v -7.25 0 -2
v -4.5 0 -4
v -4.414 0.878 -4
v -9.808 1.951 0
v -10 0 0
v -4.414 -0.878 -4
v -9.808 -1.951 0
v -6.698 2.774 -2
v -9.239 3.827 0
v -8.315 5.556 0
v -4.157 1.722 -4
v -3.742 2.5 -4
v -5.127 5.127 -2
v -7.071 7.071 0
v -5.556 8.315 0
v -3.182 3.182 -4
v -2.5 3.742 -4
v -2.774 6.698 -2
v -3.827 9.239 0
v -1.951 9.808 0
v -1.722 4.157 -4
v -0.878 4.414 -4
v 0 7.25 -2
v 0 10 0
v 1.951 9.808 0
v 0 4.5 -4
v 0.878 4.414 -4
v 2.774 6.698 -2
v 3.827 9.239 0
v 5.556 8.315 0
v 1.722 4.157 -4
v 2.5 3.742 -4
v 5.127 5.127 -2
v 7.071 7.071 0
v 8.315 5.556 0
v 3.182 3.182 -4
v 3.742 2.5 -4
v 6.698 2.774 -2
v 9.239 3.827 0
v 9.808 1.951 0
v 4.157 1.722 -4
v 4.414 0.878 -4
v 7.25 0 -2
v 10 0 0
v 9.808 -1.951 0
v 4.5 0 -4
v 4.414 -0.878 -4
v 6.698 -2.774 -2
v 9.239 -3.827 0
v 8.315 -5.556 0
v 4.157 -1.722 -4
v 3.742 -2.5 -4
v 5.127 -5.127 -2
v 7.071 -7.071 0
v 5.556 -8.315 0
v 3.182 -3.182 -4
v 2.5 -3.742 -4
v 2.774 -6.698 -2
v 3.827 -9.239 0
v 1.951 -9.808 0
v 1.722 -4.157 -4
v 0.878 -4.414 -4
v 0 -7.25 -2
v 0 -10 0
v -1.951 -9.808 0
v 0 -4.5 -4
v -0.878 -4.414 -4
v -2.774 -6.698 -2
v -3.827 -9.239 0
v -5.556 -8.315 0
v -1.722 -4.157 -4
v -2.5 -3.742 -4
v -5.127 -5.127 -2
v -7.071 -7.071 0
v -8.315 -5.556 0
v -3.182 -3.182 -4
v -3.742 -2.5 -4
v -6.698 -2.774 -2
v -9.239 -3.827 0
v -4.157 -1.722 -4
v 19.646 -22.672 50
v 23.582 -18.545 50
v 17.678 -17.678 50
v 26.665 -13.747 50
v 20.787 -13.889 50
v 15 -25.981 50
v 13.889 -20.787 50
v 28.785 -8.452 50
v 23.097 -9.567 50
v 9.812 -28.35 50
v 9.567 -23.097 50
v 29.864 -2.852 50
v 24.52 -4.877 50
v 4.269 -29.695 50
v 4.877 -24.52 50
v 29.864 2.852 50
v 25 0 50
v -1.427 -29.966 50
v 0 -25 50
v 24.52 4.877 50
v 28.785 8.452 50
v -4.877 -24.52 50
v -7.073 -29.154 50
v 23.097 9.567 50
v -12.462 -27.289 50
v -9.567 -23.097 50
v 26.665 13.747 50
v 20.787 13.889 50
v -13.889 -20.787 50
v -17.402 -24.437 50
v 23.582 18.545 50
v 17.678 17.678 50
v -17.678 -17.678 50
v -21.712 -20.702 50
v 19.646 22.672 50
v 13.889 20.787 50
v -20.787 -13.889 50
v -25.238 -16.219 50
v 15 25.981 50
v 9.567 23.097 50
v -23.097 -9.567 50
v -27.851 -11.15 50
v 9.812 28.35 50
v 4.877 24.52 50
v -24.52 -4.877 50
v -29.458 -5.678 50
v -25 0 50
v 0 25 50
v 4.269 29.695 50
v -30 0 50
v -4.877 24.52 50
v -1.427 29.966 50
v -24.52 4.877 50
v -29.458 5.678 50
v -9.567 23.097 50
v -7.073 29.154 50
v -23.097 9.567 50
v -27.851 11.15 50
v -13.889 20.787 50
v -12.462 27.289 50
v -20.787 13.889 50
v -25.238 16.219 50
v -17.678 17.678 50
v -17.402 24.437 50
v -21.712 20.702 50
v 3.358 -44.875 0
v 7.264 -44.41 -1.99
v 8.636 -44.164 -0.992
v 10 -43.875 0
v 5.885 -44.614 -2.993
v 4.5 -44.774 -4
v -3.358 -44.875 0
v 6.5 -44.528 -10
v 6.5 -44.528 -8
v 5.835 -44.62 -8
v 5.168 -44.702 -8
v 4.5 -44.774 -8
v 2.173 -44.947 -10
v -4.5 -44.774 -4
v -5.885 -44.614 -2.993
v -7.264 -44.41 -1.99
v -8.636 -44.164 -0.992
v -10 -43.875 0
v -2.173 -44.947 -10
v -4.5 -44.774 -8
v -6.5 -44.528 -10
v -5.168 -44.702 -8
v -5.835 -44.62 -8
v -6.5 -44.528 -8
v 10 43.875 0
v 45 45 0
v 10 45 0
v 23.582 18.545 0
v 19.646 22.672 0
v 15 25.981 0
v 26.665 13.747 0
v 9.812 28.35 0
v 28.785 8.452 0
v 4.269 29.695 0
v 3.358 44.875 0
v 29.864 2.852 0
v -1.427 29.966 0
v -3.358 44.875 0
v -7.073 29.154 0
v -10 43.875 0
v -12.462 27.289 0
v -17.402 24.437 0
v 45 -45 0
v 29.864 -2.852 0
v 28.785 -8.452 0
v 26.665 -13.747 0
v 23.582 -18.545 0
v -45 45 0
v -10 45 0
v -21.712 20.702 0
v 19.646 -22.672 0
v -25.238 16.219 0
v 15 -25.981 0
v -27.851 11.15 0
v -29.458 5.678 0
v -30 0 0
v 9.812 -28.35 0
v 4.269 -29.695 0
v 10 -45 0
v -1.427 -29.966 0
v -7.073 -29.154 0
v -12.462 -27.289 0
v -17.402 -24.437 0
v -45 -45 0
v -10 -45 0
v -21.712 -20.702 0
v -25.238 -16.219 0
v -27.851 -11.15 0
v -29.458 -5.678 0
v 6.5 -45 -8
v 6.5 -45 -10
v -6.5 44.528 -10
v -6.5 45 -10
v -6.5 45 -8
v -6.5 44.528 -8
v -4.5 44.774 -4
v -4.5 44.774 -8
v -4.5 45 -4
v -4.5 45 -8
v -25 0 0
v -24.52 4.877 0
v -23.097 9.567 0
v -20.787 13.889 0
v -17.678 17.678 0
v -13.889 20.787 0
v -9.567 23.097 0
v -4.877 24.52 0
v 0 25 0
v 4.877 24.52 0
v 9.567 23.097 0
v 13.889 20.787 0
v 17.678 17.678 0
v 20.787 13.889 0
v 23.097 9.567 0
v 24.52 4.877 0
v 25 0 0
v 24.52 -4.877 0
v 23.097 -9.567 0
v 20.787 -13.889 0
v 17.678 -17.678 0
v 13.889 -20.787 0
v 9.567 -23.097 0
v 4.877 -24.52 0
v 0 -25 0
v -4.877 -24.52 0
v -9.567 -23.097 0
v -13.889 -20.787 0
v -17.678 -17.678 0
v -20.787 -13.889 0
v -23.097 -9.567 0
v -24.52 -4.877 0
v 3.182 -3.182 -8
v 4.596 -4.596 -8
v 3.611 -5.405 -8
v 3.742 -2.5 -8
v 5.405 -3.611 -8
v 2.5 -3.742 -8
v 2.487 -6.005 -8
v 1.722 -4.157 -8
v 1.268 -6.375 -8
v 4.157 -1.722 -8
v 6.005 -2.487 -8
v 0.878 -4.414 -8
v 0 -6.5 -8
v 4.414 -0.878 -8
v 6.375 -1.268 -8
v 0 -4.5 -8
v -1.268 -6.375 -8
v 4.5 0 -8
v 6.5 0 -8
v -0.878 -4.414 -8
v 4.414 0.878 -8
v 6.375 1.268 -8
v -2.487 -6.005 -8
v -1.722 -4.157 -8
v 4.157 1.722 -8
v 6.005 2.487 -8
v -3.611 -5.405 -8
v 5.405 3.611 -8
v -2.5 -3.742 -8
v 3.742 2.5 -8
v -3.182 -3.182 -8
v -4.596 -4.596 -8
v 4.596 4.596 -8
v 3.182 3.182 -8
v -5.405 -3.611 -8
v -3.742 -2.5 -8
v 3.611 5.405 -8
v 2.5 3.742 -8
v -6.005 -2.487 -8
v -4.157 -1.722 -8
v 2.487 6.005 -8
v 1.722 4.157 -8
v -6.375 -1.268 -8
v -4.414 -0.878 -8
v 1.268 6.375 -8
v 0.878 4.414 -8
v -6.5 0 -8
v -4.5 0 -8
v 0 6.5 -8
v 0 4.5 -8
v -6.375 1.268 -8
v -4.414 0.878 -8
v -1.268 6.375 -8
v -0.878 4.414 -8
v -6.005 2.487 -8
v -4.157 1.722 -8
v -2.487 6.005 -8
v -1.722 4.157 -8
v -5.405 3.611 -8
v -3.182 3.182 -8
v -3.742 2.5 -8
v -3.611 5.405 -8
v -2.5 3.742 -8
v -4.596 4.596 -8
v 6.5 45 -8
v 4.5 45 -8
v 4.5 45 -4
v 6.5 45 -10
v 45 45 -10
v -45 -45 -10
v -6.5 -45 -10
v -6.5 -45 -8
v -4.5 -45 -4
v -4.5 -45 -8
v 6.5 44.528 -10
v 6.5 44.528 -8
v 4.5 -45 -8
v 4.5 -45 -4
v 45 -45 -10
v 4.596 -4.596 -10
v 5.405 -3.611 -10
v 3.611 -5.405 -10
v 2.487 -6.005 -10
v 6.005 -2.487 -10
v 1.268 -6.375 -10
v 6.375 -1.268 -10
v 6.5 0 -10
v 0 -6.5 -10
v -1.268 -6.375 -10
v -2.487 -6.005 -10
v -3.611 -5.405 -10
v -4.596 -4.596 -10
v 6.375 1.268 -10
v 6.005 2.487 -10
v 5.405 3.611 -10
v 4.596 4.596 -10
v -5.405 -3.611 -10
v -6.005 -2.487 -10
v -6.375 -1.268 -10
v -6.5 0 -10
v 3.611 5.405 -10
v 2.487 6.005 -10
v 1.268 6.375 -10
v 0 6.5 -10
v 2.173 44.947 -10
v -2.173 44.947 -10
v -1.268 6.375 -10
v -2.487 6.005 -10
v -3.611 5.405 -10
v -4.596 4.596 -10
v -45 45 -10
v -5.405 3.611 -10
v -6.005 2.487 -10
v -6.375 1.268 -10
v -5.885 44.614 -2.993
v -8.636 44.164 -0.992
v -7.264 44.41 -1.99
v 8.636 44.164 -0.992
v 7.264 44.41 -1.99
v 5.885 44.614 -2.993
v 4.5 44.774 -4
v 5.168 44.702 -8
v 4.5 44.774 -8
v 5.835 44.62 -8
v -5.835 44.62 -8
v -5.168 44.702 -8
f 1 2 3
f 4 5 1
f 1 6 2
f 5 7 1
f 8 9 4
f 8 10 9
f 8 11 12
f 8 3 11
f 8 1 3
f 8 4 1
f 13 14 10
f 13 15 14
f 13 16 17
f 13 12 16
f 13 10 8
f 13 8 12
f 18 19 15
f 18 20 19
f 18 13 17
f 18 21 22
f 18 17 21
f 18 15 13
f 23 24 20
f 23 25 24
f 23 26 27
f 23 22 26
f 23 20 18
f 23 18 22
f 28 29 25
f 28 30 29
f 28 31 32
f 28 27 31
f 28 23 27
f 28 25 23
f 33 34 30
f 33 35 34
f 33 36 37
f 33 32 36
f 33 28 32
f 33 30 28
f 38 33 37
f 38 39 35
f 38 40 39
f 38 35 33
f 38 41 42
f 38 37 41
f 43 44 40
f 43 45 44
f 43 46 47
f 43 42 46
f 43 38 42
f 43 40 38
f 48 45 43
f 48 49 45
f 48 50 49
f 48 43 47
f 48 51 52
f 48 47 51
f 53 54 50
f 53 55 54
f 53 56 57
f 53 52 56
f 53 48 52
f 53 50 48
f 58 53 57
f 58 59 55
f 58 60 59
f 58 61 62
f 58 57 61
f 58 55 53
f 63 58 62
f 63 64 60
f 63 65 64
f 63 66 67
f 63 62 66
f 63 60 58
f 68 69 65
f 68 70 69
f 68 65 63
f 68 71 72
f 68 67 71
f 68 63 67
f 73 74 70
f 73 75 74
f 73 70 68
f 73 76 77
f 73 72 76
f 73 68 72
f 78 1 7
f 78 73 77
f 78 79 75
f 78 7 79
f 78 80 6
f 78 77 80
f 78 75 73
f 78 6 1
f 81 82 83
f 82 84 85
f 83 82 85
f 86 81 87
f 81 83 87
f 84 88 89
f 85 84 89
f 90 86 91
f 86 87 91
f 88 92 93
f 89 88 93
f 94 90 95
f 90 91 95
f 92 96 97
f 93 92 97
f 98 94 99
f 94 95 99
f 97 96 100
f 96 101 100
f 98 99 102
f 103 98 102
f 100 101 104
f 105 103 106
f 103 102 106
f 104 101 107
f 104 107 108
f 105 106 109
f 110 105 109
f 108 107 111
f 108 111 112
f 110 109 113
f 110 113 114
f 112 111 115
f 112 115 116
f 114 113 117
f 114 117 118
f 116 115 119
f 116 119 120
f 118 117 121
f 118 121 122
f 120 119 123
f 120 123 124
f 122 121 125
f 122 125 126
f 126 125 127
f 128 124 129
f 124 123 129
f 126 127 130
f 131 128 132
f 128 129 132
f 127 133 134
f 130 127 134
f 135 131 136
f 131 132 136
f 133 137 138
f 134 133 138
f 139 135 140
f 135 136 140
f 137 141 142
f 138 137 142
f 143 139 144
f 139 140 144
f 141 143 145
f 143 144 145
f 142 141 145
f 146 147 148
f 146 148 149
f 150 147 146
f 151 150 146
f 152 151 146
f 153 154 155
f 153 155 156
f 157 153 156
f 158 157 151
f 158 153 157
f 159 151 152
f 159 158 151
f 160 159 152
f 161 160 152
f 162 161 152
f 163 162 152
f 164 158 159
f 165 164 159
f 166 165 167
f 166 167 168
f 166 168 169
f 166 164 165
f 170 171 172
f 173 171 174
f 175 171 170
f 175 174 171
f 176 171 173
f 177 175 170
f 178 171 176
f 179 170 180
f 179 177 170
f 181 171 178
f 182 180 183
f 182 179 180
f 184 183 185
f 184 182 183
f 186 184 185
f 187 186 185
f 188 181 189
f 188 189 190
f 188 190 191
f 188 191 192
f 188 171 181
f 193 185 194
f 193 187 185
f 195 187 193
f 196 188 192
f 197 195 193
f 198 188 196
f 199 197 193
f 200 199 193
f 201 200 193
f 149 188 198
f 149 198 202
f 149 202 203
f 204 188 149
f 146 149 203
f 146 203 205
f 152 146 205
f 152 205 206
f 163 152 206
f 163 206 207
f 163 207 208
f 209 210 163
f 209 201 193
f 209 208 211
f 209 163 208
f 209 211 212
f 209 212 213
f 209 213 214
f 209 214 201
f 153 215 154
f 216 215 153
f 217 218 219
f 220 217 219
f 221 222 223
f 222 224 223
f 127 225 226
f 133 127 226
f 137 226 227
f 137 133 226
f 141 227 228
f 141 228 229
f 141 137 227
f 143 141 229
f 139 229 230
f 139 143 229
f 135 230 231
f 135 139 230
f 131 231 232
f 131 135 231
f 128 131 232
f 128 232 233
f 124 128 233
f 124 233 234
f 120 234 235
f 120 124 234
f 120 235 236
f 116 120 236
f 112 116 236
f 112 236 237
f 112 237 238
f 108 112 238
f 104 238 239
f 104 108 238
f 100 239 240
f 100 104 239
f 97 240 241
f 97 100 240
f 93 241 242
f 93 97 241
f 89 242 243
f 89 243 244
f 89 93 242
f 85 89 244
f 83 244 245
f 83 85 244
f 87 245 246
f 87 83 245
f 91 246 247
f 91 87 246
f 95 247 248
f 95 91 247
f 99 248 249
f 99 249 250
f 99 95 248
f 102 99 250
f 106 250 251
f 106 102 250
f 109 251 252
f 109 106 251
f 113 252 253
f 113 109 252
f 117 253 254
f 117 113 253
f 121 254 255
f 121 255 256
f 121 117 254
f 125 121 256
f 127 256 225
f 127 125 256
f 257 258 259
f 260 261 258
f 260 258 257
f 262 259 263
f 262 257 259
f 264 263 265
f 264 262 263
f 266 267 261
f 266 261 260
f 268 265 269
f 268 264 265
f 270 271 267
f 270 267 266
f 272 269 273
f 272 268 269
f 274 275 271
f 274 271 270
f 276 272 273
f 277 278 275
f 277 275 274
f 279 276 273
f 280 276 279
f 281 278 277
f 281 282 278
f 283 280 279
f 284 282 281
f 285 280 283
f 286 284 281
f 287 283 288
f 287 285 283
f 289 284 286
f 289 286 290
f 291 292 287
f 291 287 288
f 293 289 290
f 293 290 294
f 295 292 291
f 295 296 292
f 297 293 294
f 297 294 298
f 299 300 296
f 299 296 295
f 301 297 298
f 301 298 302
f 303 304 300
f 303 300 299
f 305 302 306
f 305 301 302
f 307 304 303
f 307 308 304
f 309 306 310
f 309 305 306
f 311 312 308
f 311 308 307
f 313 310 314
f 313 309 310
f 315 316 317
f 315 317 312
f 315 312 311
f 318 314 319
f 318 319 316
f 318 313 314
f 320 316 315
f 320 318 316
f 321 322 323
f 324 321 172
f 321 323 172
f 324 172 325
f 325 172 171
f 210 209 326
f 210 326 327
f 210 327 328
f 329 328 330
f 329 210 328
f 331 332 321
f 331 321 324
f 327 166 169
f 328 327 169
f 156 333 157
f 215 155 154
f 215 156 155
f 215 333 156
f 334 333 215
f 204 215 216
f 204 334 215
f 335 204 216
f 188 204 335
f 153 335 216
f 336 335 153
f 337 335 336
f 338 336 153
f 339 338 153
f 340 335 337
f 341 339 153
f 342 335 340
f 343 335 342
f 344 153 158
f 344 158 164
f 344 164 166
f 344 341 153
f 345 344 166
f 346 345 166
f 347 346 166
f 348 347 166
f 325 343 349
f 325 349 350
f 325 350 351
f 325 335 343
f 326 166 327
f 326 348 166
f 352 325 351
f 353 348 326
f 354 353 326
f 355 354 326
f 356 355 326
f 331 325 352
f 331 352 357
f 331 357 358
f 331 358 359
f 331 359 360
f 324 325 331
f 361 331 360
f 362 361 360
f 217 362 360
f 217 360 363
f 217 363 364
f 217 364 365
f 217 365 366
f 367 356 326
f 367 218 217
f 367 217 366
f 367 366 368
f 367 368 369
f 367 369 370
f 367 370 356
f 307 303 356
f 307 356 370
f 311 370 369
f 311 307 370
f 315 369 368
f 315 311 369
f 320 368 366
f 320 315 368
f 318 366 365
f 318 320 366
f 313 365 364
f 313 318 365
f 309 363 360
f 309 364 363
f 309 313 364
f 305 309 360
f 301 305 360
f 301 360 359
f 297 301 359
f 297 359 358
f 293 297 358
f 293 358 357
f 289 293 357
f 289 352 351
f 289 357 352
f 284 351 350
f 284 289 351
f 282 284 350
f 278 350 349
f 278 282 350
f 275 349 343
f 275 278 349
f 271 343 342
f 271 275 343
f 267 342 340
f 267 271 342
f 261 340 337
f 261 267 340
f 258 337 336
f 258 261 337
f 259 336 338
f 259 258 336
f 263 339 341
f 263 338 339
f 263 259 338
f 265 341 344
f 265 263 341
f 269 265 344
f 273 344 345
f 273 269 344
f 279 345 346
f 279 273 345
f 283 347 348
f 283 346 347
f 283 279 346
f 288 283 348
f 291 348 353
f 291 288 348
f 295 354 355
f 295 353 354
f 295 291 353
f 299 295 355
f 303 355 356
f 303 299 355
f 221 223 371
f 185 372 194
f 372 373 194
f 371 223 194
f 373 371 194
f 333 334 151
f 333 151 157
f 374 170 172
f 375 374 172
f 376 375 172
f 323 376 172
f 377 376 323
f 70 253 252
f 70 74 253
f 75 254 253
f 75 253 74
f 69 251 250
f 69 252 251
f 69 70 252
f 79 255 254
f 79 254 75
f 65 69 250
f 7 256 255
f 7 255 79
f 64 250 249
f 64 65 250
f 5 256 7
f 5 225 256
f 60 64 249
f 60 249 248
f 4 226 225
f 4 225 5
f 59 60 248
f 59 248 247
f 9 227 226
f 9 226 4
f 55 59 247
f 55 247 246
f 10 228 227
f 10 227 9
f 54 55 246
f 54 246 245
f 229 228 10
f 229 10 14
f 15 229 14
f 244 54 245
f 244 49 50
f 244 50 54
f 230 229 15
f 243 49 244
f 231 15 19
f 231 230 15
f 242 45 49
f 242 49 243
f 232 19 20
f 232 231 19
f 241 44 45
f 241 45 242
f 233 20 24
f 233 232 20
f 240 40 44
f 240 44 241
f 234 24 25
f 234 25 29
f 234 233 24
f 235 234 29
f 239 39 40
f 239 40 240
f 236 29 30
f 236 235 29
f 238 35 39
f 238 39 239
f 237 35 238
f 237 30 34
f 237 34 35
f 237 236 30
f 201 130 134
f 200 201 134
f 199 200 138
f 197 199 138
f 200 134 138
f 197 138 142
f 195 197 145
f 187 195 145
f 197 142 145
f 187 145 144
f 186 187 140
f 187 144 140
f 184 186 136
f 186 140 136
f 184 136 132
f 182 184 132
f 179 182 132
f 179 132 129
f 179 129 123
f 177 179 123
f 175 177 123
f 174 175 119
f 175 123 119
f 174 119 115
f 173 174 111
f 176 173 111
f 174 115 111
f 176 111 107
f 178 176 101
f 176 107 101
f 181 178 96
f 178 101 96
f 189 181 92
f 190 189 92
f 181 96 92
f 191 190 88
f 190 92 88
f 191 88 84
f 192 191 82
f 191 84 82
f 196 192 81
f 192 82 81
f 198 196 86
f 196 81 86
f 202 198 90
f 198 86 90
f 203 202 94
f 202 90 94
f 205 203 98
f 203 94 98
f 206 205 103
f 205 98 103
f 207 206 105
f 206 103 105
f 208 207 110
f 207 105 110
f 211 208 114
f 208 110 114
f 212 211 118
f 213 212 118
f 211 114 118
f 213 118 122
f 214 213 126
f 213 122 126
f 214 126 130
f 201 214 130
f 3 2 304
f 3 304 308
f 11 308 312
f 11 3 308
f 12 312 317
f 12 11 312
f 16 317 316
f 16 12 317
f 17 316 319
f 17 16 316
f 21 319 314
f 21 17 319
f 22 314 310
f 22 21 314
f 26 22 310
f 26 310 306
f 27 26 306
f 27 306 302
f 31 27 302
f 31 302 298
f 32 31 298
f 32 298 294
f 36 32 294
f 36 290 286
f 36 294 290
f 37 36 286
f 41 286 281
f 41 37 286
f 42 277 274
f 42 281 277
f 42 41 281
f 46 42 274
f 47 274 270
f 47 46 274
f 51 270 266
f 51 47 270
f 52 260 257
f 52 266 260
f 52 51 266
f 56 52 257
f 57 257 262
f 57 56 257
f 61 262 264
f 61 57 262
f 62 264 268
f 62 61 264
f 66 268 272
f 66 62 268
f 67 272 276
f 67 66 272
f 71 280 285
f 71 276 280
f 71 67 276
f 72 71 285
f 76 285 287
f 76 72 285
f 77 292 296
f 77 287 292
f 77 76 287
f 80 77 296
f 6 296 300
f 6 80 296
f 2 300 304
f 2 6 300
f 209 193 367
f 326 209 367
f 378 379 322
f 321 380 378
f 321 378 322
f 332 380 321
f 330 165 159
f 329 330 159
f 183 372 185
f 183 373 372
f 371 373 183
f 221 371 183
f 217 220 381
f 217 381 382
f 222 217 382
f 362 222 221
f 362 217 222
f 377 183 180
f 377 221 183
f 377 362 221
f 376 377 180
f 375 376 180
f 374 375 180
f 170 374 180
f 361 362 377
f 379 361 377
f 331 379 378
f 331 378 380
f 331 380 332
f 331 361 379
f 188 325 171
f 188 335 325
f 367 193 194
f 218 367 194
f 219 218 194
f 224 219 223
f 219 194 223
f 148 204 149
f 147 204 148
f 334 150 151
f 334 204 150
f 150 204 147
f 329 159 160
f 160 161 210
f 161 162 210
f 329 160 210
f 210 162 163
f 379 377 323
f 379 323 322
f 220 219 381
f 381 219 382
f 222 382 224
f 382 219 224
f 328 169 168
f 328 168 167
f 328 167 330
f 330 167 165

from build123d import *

# Parameters (mm, degrees)
F0_W     = 5
F0_H     = 50
F0_W_2   = 15
F0_H_2   = 10
F2_DEPTH = 45


with BuildPart() as f1:
    # F0 (on Front) → F1 (revolve)
    with BuildSketch(Plane.XZ):
        with Locations((-27.5, 25)):
            Rectangle(F0_W, F0_H)
        Polygon((-25, 0), (-30, 0), (-45, 0), (-45, -10), (-30, -10), (-6.5, -10), (-6.5, -8), (-4.5, -8), (-4.5, -4), (-10, 0), align=None)
    revolve(axis=Axis((0, 0, -5), (0, 0, -1)))

    # F0 (on Front) → F2 (join, symmetric)
    with BuildSketch(Plane.XZ):
        Polygon((-25, 0), (-30, 0), (-45, 0), (-45, -10), (-30, -10), (-6.5, -10), (-6.5, -8), (-4.5, -8), (-4.5, -4), (-10, 0), align=None)
        Polygon((25, 0), (10, 0), (4.5, -4), (4.5, -8), (6.5, -8), (6.5, -10), (30, -10), (30, 0), align=None)
        with Locations((37.5, -5)):
            Rectangle(F0_W_2, F0_H_2)
    extrude(amount=F2_DEPTH, both=True)


solid = f1.part
